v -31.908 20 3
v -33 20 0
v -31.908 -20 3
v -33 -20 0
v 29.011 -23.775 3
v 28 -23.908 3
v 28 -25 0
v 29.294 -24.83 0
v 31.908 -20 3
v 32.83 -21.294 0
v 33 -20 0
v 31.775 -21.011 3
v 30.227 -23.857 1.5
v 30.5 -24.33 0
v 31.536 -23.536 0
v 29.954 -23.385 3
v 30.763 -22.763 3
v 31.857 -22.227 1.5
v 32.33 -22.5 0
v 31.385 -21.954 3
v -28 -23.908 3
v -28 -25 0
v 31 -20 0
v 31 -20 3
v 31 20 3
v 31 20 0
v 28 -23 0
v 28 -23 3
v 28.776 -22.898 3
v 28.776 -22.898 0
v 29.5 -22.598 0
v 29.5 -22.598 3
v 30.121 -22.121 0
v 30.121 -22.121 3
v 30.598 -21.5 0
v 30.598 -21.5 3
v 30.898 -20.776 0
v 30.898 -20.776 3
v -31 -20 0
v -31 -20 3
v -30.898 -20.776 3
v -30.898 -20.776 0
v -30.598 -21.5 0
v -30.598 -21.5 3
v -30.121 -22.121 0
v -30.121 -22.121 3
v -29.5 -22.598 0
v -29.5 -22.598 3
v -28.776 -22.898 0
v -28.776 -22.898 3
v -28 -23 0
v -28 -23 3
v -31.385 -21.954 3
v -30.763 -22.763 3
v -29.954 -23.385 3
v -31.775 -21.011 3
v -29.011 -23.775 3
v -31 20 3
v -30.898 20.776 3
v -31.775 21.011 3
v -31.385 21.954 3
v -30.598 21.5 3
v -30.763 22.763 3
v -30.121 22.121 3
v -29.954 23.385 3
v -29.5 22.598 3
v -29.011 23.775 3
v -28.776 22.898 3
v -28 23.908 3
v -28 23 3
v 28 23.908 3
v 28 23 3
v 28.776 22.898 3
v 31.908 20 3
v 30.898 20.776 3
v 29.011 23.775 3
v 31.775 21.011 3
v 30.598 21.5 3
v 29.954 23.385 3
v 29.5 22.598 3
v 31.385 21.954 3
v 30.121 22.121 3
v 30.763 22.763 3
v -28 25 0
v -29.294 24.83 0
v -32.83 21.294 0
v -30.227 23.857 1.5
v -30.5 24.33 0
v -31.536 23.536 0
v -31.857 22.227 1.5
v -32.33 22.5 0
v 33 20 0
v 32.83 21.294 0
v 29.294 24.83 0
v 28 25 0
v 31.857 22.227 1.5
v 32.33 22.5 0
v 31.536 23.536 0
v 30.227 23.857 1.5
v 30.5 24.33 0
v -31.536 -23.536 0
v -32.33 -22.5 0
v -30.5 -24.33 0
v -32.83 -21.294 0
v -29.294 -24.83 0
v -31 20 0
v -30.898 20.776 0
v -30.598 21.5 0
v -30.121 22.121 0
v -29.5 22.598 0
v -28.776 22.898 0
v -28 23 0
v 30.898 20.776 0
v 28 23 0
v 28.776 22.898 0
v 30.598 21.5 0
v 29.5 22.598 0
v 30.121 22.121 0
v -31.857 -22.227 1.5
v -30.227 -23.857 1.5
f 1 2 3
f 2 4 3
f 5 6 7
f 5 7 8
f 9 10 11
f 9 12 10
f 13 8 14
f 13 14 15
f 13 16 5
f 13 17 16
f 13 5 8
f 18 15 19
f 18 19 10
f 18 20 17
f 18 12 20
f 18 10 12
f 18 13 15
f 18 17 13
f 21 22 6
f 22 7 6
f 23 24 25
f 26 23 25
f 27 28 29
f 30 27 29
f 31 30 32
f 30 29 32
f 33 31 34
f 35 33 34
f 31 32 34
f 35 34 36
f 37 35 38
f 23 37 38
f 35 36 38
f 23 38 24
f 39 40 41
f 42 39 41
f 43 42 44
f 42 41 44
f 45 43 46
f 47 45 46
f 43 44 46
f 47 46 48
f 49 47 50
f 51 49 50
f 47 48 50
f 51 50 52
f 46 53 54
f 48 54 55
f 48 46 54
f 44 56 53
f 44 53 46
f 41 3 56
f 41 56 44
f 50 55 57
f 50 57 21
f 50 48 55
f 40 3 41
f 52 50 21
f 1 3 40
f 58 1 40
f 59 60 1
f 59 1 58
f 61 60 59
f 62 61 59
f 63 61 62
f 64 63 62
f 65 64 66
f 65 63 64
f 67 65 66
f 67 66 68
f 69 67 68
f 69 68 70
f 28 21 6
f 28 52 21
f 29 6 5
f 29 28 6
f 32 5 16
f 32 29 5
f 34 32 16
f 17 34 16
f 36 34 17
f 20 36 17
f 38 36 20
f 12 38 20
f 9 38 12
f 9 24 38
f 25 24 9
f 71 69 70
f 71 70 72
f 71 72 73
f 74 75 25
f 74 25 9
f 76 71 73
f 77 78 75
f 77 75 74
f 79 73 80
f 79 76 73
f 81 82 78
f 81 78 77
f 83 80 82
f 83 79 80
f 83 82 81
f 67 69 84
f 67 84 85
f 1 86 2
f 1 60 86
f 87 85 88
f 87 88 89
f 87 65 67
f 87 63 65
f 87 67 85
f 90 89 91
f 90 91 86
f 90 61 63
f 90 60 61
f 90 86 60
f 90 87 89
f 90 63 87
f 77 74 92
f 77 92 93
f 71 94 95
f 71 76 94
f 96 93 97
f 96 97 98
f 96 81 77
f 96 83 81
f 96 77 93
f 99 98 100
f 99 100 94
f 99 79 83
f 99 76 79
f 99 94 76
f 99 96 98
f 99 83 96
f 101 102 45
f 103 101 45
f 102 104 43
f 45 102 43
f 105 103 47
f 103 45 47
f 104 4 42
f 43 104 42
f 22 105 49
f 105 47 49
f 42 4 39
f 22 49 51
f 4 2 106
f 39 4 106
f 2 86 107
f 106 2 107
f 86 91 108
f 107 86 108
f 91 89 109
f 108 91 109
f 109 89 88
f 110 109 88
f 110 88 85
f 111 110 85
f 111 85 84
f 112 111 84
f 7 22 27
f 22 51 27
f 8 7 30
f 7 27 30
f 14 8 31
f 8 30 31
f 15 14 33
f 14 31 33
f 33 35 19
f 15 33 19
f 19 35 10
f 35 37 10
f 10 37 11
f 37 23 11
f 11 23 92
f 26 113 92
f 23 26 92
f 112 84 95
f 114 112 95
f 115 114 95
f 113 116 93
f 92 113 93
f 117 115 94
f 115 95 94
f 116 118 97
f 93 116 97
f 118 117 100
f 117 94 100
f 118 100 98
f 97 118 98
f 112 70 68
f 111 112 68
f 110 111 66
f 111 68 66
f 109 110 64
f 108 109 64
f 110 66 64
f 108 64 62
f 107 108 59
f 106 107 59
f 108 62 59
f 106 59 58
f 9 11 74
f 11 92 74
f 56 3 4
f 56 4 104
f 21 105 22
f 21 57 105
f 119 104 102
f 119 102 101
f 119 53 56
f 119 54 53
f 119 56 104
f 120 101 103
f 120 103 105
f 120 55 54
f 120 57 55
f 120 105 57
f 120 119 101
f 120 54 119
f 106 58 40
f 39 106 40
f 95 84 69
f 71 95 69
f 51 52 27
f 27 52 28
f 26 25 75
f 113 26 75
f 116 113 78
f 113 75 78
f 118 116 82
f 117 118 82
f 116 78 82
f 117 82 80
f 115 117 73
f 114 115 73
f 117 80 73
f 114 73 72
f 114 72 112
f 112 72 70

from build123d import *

# Parameters (mm, degrees)
BOSS_EXTRUDE1_DEPTH = 3
BOSS_EXTRUDE1_TAPER = 20
CUT_EXTRUDE1_DEPTH  = 42.509035161


with BuildPart() as part:
    # Sketch1 → Boss-Extrude1 (new body)
    with BuildSketch(Plane.XY):
        with BuildLine():
            Line((-28, -25), (28, -25))
            ThreePointArc((28, -25), (31.535533906, -23.535533906), (33, -20))
            Line((33, -20), (33, 20))
            ThreePointArc((33, 20), (31.535533906, 23.535533906), (28, 25))
            Line((28, 25), (-28, 25))
            ThreePointArc((-28, 25), (-31.535533906, 23.535533906), (-33, 20))
            Line((-33, 20), (-33, -20))
            ThreePointArc((-33, -20), (-31.535533906, -23.535533906), (-28, -25))
        make_face()
    extrude(amount=BOSS_EXTRUDE1_DEPTH, taper=BOSS_EXTRUDE1_TAPER)

    # Sketch2 → Cut-Extrude1 (cut, through all)
    with BuildSketch(Plane.XY.offset(3)):
        with BuildLine():
            Line((-28, -23), (28, -23))
            ThreePointArc((28, -23), (30.121320344, -22.121320344), (31, -20))
            Line((31, -20), (31, 20))
            ThreePointArc((31, 20), (30.121320344, 22.121320344), (28, 23))
            Line((28, 23), (-28, 23))
            ThreePointArc((-28, 23), (-30.121320344, 22.121320344), (-31, 20))
            Line((-31, 20), (-31, -20))
            ThreePointArc((-31, -20), (-30.121320344, -22.121320344), (-28, -23))
        make_face()
    extrude(amount=-CUT_EXTRUDE1_DEPTH, mode=Mode.SUBTRACT)


solid = part.part
